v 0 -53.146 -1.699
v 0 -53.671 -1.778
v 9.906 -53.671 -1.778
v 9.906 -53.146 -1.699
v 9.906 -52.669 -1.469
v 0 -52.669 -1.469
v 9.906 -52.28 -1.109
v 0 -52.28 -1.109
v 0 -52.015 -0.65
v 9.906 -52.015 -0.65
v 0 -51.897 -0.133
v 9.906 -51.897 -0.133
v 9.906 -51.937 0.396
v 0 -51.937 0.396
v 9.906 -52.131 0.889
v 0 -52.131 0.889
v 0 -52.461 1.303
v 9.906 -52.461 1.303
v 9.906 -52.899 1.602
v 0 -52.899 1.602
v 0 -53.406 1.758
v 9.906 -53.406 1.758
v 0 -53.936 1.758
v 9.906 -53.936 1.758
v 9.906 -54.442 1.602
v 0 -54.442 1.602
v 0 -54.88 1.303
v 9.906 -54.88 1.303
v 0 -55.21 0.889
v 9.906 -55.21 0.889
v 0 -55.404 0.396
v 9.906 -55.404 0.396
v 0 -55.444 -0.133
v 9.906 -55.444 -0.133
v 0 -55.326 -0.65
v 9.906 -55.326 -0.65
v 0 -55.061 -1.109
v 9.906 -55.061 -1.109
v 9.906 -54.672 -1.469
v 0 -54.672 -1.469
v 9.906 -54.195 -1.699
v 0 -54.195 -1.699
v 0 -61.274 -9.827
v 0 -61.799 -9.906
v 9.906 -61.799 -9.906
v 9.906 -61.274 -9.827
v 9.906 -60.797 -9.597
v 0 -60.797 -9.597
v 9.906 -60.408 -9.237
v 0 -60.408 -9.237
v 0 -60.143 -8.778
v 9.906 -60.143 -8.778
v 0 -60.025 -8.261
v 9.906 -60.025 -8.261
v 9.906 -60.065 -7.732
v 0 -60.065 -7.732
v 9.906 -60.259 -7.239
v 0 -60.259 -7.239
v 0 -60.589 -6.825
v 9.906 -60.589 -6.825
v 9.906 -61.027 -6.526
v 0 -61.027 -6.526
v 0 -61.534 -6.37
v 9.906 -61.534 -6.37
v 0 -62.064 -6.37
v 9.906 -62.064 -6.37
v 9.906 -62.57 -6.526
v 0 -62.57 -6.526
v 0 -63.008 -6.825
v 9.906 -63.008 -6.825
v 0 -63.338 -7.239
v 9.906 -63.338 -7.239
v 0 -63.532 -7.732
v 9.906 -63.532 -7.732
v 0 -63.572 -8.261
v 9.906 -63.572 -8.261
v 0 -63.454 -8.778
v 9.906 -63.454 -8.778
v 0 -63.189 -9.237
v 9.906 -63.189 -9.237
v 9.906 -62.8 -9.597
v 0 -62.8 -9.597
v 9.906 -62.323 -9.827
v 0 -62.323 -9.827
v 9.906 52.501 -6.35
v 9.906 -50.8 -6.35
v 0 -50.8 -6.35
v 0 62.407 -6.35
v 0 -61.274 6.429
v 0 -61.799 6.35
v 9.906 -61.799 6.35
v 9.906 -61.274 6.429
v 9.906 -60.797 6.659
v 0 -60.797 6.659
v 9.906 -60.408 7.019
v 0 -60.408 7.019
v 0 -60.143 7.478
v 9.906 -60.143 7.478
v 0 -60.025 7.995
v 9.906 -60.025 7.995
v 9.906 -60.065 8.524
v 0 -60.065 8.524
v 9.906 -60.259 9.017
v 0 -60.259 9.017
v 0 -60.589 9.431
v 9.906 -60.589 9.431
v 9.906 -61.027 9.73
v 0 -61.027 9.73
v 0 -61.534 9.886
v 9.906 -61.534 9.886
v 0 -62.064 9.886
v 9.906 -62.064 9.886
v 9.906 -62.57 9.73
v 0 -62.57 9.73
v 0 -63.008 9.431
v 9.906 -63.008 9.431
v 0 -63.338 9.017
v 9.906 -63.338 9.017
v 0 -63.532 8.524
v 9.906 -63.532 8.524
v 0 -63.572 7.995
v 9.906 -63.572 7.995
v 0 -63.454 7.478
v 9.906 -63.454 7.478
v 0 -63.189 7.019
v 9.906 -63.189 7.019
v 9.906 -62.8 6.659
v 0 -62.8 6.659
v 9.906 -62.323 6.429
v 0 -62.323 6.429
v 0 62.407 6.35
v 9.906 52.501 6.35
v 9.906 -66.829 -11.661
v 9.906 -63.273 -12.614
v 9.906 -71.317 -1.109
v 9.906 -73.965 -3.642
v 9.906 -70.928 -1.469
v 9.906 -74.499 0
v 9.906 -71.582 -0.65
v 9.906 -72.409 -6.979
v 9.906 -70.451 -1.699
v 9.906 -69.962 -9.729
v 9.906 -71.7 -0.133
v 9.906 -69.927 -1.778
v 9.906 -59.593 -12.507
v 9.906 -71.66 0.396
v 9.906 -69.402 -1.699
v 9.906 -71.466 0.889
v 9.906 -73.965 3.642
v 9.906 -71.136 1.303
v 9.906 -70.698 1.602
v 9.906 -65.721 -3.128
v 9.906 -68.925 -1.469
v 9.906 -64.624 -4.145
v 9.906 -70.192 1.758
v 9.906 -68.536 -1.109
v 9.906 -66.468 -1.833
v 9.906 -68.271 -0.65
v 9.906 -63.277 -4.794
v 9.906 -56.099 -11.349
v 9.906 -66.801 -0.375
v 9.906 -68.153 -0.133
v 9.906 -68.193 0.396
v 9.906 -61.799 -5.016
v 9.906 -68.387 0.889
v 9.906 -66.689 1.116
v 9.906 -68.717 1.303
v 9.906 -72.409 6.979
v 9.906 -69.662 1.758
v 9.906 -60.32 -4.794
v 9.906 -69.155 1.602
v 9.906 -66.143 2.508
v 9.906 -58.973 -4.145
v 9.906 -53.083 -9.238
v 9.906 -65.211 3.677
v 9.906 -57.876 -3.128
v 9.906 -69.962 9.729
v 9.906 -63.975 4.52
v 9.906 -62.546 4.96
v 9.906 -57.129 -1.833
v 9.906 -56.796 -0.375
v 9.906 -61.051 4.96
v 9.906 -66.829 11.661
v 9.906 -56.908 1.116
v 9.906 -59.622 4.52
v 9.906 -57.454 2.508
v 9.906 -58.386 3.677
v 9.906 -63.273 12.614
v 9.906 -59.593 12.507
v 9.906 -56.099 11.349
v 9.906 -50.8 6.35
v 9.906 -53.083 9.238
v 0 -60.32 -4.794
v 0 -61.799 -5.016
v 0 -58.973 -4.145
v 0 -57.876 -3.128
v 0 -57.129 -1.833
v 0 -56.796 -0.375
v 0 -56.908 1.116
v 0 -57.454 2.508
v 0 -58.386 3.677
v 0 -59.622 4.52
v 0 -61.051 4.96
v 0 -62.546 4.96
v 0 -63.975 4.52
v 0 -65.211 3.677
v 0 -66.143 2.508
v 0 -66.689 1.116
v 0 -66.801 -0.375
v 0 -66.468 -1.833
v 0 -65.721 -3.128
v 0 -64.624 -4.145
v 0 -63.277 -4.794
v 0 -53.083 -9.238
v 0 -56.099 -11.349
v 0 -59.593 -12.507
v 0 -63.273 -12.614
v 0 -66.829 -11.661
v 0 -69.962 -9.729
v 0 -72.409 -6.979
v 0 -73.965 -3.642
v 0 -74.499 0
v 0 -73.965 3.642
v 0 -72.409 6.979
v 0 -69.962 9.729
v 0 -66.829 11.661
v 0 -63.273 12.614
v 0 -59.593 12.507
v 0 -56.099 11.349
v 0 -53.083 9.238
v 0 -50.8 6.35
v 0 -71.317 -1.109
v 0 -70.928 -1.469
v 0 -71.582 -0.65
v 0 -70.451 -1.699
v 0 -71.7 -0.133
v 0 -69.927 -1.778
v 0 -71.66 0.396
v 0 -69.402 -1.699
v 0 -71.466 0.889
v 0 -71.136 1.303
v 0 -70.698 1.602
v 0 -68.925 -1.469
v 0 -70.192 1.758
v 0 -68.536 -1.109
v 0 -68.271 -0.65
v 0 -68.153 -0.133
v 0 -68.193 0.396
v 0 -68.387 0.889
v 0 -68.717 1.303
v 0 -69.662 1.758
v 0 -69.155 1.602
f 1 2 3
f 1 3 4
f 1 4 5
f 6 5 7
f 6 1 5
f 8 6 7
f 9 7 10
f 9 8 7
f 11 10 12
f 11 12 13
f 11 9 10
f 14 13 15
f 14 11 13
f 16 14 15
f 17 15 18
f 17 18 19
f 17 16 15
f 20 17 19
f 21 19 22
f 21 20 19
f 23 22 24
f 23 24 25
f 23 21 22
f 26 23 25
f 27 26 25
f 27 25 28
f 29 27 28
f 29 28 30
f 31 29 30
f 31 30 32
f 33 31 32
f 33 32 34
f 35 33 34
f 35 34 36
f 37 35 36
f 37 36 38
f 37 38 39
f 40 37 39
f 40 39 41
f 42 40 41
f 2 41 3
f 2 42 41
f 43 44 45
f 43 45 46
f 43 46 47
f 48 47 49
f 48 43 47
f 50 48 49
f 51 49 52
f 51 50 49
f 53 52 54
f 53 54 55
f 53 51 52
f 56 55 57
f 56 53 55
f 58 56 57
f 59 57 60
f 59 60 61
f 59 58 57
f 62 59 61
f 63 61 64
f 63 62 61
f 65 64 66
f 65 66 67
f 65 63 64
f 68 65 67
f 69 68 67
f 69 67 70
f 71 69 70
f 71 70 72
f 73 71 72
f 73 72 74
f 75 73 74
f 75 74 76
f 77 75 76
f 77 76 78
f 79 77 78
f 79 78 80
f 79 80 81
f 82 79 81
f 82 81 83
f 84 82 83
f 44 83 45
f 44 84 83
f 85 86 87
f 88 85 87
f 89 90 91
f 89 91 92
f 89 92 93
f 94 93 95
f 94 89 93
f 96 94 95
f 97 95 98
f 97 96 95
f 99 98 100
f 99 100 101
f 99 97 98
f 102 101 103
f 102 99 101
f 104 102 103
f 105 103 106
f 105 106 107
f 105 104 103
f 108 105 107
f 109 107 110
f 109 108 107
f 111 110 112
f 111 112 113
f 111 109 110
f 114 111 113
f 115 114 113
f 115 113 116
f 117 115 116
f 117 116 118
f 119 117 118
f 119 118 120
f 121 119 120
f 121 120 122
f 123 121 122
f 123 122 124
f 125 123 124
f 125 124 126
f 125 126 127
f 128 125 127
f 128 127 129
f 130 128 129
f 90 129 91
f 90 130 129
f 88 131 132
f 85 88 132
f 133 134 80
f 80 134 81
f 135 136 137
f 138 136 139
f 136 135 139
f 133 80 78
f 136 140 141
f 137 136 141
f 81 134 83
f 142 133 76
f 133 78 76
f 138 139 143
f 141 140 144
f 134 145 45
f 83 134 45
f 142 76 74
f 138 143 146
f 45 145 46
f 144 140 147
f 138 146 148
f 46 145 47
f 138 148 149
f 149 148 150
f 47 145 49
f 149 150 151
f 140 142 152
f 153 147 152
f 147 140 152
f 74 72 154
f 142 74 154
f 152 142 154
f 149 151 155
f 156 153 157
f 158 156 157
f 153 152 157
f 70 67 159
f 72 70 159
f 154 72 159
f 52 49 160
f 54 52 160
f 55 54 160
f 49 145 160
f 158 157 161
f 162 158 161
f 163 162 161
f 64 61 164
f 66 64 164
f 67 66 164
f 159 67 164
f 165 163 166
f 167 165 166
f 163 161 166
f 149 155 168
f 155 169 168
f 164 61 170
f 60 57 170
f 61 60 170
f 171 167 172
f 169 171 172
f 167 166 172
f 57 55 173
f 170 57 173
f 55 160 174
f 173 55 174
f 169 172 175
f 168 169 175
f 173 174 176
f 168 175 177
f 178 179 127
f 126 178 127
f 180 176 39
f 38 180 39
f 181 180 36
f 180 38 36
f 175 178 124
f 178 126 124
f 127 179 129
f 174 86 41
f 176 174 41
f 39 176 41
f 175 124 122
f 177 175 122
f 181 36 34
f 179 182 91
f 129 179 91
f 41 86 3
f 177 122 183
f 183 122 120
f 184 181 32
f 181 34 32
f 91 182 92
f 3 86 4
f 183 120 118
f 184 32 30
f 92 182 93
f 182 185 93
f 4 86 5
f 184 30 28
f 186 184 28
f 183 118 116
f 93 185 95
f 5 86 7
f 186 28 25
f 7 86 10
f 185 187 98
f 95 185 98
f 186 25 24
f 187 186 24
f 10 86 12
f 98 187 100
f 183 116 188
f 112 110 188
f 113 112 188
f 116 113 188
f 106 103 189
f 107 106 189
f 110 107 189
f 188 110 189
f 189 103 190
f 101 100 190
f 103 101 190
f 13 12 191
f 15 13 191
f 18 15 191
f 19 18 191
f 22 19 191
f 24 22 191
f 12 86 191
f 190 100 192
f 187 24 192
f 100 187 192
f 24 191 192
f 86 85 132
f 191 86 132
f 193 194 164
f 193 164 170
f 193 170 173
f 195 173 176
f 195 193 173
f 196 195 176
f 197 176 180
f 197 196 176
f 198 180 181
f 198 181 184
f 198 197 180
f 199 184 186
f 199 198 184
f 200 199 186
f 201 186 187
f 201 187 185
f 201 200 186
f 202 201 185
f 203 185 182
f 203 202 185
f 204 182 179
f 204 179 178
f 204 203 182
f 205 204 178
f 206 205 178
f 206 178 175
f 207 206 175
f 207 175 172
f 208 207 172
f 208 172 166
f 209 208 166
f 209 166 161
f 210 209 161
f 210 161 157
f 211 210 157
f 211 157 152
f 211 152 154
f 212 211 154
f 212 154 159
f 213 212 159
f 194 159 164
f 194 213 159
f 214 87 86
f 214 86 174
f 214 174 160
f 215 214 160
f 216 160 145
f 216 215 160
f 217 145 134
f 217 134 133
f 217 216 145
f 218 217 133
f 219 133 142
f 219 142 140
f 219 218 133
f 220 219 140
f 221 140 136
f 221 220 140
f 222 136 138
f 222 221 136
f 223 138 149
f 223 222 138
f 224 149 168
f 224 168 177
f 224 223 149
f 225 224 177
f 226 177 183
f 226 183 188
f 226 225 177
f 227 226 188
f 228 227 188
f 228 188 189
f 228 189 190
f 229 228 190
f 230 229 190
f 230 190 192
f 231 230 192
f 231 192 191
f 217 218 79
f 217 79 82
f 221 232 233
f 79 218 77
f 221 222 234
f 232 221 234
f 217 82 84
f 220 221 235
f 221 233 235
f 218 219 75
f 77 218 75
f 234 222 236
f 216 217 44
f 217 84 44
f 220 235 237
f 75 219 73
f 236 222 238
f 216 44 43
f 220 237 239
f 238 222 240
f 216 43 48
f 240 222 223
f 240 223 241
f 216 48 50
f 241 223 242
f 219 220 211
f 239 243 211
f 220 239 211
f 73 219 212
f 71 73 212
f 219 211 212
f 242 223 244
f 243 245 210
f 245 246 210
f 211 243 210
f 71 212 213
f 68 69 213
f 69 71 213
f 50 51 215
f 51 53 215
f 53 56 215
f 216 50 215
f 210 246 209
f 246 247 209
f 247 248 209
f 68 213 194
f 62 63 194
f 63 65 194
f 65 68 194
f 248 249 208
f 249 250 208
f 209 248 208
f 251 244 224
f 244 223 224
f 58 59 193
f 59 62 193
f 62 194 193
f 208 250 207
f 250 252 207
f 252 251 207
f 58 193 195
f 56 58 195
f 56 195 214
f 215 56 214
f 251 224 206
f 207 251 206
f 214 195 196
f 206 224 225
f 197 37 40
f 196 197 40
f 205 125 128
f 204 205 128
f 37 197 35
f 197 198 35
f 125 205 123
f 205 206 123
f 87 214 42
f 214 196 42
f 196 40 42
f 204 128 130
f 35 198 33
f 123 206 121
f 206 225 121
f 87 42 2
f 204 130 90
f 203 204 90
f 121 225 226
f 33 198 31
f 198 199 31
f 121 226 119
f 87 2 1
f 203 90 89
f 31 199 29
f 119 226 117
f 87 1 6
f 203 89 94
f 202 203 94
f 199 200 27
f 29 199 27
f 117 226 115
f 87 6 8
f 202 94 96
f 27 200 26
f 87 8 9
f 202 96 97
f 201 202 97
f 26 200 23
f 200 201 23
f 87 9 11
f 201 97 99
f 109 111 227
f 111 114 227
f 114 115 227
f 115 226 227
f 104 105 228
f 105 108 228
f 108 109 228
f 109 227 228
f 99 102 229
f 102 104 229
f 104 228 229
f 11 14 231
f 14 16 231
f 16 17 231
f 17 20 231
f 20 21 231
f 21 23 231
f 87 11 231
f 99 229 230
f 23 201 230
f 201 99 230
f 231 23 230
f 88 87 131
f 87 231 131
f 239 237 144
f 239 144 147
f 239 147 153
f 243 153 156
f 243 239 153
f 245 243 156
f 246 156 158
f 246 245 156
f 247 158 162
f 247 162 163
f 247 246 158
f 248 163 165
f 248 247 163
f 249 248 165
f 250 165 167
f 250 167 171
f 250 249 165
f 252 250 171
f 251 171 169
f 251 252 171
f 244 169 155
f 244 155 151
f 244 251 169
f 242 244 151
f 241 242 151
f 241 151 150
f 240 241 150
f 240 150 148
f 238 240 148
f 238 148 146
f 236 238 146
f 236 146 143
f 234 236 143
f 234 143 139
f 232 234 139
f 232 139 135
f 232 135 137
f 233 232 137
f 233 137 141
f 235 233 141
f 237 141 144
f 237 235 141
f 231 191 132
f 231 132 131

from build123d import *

# Parameters (mm, degrees)
SKETCH1_R           = 5.0165
SKETCH1_R_2         = 1.778
BOSS_EXTRUDE1_DEPTH = 9.906
BOSS_EXTRUDE2_DEPTH = 12.7


with BuildPart() as part:
    # Sketch1 → Boss-Extrude1 (new body)
    with BuildSketch(Plane(origin=(0, 0, 0), x_dir=(0, 0, -1), z_dir=(1, 0, 0))):
        with BuildLine():
            Line((-6.35, -50.8), (-6.35, 52.501477372))
            Line((-6.35, 52.501477372), (6.35, 52.501477372))
            Line((6.35, 52.501477372), (6.35, -50.8))
            ThreePointArc((6.35, -50.8), (0, -74.498522628), (-6.35, -50.8))
        make_face()
        with Locations((0, -61.798522628)):
            Circle(SKETCH1_R, mode=Mode.SUBTRACT)
        with Locations((-8.128, -61.798522628)):
            Circle(SKETCH1_R_2, mode=Mode.SUBTRACT)
        with Locations((8.128, -61.798522628)):
            Circle(SKETCH1_R_2, mode=Mode.SUBTRACT)
        with Locations((0, -53.670522628)):
            Circle(SKETCH1_R_2, mode=Mode.SUBTRACT)
        with Locations((0, -69.926522628)):
            Circle(SKETCH1_R_2, mode=Mode.SUBTRACT)
    extrude(amount=BOSS_EXTRUDE1_DEPTH)

    # Sketch2 → Boss-Extrude2 (add)
    with BuildSketch(Plane.XY.offset(6.35)):
        Polygon((9.906, 52.501477372), (0, 52.501477372), (0, 62.407477372), align=None)
    extrude(amount=-BOSS_EXTRUDE2_DEPTH)


solid = part.part
